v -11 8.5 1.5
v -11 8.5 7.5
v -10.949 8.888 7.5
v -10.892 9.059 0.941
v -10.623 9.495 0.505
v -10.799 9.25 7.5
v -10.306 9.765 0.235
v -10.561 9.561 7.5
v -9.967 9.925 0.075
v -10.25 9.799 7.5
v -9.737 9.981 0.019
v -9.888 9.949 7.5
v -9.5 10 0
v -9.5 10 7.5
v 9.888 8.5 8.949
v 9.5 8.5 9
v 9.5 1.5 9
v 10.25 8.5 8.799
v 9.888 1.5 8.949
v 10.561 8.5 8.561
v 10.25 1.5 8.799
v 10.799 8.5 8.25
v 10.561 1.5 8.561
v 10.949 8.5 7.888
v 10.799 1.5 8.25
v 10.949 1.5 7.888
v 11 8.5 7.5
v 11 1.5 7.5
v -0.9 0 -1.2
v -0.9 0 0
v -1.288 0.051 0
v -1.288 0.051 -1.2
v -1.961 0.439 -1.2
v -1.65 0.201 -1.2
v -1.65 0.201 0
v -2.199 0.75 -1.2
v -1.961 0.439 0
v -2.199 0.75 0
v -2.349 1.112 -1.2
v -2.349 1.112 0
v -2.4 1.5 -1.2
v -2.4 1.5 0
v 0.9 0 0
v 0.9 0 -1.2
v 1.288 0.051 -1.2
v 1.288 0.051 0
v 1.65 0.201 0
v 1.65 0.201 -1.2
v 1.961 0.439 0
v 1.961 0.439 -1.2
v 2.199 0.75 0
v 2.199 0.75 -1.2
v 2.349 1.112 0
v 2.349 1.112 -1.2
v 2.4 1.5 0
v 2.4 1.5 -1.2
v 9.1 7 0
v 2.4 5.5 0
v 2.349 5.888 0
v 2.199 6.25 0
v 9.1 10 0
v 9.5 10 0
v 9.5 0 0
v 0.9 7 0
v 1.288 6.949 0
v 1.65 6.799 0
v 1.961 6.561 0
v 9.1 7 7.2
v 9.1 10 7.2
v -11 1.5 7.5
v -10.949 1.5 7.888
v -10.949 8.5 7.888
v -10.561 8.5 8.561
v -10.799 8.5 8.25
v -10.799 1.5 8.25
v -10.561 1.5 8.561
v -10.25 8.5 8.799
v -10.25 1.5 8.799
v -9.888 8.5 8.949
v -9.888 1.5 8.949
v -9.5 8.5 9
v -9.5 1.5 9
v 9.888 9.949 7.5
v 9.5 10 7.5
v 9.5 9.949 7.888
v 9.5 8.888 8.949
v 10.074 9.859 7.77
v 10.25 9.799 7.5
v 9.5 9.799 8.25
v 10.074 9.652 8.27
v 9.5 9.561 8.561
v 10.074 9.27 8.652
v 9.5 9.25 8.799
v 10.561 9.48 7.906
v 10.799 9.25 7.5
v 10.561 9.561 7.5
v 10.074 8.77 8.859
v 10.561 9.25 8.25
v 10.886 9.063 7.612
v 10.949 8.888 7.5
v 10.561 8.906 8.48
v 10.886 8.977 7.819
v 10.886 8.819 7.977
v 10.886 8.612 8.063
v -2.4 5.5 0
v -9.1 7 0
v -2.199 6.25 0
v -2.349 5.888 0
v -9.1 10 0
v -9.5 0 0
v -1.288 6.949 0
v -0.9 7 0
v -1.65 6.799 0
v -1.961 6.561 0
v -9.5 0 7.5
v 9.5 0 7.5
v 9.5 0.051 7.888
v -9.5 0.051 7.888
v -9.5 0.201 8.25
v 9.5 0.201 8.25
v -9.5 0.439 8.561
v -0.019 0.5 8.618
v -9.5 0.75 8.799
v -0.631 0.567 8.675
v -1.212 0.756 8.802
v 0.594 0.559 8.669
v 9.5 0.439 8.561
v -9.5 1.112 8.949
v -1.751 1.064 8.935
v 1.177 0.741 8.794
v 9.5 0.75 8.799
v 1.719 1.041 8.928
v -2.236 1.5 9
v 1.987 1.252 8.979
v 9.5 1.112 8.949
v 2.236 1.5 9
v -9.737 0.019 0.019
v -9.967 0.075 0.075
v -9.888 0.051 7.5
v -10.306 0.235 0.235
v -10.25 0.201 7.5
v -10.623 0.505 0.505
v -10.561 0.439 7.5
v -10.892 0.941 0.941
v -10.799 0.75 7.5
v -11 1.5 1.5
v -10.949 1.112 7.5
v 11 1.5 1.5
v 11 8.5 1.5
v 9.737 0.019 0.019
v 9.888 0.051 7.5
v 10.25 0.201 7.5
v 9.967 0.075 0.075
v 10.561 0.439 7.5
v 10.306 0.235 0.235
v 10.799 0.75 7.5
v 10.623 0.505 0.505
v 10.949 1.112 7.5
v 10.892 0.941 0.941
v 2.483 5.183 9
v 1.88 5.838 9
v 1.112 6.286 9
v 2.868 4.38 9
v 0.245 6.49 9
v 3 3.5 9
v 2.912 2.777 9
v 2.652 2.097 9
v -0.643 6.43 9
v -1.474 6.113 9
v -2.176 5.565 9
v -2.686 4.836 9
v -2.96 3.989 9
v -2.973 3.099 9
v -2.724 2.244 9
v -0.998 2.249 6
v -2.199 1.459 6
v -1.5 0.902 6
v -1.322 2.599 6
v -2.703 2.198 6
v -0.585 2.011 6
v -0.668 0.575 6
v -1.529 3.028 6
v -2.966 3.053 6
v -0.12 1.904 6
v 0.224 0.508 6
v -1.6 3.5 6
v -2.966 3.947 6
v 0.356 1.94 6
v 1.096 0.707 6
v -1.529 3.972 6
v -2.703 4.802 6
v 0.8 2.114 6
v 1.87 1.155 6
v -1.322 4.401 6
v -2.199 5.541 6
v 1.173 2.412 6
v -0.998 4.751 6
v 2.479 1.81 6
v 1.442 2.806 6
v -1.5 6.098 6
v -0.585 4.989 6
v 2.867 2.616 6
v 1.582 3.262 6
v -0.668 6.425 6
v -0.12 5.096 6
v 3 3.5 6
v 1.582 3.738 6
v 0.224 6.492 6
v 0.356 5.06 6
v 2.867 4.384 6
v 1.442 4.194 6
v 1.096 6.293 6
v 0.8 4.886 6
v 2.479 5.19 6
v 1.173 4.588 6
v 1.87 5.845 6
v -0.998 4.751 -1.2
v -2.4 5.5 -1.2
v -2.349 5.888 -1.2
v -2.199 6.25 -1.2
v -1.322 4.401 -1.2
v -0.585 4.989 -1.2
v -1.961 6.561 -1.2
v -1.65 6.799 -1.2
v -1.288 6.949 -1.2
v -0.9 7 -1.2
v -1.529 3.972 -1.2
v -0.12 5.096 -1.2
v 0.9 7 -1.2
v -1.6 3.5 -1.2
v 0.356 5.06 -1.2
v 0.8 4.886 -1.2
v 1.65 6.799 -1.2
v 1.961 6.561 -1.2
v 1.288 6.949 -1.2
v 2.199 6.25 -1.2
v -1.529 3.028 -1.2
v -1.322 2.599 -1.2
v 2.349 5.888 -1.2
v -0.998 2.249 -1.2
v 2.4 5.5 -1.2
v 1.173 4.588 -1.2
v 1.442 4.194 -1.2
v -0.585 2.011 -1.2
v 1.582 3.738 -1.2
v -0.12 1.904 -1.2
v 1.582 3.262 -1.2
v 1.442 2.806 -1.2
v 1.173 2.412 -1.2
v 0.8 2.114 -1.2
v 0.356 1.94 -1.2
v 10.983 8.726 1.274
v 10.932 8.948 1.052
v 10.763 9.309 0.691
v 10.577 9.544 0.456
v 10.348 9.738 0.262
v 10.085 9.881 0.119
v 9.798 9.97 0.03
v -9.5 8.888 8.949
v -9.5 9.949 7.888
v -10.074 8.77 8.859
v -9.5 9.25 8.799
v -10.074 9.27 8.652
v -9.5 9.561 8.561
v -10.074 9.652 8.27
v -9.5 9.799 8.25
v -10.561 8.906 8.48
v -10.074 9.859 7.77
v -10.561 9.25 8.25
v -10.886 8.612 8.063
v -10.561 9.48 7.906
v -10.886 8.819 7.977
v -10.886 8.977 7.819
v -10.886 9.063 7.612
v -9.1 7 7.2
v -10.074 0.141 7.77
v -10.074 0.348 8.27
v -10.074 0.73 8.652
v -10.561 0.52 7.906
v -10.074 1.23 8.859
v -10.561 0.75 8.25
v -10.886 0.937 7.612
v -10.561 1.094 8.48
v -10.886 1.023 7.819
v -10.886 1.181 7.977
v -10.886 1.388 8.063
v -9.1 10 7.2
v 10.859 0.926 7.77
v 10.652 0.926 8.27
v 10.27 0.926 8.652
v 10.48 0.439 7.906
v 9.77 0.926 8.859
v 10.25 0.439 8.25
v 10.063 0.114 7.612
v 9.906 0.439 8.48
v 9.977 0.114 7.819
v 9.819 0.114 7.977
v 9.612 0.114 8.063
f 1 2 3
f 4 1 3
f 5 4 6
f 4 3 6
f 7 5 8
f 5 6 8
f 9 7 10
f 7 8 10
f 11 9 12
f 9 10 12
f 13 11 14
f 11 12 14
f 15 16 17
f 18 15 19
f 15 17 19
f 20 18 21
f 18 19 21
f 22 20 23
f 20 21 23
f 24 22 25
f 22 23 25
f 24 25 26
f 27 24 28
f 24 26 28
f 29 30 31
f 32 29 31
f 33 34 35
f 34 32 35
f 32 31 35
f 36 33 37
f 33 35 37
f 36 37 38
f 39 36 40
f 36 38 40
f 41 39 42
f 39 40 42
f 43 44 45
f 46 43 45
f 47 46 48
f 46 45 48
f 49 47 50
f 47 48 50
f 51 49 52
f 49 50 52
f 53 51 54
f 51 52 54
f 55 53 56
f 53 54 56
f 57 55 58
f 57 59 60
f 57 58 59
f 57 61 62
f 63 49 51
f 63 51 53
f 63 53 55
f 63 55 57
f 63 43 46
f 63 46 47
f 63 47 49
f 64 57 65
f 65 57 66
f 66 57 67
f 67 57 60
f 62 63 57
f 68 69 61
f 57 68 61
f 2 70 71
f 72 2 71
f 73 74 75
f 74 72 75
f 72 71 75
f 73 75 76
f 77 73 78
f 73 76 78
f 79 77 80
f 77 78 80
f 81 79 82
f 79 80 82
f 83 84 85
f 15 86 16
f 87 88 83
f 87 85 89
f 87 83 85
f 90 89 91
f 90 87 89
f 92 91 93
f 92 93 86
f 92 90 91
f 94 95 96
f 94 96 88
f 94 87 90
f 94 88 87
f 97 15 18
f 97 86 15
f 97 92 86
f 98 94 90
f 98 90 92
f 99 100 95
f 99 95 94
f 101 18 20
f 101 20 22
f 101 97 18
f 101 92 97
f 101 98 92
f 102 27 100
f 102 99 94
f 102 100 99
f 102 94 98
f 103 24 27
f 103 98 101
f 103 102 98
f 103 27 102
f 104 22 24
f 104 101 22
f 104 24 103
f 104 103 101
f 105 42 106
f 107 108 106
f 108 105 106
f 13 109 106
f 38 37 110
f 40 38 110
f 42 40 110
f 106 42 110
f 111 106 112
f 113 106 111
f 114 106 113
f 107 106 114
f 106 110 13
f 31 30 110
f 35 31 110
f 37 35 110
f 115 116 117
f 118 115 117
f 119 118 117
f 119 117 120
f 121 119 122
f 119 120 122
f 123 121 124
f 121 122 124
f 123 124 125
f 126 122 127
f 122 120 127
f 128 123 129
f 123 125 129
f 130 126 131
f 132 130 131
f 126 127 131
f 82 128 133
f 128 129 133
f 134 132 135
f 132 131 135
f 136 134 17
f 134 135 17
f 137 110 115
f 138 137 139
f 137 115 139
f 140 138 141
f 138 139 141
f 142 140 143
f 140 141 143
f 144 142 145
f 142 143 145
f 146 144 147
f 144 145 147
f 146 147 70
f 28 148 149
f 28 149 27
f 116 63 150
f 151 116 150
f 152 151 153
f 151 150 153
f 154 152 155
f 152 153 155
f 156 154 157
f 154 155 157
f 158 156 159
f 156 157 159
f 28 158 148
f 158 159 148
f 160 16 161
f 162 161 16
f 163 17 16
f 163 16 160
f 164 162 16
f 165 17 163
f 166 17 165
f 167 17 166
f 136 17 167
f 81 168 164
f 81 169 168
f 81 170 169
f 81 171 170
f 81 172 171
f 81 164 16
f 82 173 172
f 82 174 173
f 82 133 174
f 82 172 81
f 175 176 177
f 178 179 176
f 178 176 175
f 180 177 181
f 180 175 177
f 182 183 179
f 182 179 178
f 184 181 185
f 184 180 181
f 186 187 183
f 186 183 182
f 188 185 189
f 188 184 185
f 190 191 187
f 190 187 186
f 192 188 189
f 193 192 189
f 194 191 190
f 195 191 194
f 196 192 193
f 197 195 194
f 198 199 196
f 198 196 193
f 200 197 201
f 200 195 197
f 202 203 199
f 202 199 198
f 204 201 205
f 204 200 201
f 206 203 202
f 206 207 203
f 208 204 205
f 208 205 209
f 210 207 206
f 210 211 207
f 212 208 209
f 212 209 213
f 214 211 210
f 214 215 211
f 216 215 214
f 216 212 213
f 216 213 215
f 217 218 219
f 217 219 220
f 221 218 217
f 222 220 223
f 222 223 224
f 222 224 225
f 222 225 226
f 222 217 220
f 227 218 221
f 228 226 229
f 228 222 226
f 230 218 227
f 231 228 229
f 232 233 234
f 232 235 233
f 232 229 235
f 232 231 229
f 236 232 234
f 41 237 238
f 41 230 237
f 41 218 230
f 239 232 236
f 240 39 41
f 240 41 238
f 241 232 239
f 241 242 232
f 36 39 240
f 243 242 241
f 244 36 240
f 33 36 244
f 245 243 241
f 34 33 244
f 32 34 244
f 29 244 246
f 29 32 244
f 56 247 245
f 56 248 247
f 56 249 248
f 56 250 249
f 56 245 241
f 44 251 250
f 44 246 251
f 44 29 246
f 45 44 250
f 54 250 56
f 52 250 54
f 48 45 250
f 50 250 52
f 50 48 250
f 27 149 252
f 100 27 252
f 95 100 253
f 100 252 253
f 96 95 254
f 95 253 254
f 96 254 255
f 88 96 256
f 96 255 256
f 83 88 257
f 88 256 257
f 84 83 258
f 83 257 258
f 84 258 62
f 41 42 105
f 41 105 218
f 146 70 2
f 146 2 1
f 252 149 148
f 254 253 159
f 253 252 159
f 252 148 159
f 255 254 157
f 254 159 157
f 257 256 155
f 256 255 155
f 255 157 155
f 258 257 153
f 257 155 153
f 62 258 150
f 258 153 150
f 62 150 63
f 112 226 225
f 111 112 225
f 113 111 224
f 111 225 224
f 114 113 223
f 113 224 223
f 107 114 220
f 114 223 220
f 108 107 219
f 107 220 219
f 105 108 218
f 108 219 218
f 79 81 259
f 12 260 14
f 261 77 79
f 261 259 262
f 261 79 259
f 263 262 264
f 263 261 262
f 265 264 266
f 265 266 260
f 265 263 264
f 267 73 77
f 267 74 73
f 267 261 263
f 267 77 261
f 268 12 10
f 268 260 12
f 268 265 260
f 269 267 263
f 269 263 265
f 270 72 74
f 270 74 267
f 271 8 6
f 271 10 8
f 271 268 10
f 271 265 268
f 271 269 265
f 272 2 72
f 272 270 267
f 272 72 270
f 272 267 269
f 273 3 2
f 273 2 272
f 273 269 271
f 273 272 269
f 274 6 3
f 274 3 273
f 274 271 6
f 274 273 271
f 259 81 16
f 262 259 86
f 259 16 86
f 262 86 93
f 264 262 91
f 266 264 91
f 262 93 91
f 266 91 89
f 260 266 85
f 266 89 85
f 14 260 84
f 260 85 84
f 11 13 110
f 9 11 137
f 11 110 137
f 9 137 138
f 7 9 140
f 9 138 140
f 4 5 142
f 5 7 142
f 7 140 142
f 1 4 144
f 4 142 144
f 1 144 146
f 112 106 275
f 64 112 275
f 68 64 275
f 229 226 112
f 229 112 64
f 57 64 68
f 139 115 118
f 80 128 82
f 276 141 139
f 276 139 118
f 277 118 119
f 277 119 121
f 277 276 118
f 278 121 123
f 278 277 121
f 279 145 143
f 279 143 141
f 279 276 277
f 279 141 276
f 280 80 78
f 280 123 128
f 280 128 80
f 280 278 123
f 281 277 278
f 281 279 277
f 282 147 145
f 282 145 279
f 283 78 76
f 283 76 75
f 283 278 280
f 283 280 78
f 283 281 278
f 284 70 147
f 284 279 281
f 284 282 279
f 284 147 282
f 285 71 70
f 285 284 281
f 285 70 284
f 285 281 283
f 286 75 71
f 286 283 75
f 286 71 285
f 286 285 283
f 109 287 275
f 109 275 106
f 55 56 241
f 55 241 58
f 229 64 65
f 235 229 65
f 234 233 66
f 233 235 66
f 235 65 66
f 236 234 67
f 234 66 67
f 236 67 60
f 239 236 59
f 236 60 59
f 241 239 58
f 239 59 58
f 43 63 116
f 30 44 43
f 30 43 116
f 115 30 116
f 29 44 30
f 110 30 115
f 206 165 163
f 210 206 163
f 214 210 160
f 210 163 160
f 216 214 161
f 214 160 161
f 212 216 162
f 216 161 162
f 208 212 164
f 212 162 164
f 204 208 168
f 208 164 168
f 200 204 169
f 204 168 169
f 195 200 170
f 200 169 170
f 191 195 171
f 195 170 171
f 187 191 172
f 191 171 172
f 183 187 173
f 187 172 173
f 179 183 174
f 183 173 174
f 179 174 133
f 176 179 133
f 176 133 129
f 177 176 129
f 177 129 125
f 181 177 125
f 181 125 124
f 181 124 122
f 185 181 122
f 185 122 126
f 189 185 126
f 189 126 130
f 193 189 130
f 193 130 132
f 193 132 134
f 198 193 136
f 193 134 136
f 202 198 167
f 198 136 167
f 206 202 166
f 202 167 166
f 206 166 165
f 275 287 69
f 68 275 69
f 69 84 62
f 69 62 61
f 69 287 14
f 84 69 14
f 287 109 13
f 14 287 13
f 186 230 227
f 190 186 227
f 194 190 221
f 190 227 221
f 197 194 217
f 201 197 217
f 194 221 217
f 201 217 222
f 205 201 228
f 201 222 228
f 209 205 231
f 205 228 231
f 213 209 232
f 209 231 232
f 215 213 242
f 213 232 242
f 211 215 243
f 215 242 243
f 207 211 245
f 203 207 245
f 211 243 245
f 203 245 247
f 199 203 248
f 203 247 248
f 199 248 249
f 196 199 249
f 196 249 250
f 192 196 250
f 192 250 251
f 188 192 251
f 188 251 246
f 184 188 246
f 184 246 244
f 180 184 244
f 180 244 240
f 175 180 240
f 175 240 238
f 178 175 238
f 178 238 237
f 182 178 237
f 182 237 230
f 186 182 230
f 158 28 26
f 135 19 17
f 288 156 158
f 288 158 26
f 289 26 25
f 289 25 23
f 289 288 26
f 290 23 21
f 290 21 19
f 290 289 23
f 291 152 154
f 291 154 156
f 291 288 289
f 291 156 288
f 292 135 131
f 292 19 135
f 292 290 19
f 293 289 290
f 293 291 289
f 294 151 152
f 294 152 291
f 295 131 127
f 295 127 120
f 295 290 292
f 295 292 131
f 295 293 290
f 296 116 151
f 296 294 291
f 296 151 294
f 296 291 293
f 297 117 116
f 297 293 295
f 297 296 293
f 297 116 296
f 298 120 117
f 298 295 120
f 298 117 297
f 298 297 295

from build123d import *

# Parameters (mm, degrees)
BOSS_EXTRU_1_DEPTH      = 10
ESQUISSE2_W             = 18.2
ESQUISSE2_H             = 8.4
ENL_V_MAT_EXTRU_1_DEPTH = 3
ESQUISSE3_R             = 1.6
ENL_V_MAT_EXTRU_2_DEPTH = 19.028865744
ESQUISSE4_R             = 3
ENL_V_MAT_EXTRU_3_DEPTH = 3
CONG_1_R                = 1.5


with BuildPart() as part:
    # Esquisse1 → Boss.-Extru.1 (new body)
    with BuildSketch(Plane(origin=(0, 0, 0), x_dir=(1, 0, 0), z_dir=(0, 1, 0))):
        Polygon((2.4, 0), (11, 0), (11, -9), (-11, -9), (-11, 0), (-2.4, 0), (-2.4, 1.2), (2.4, 1.2), align=None)
    extrude(amount=BOSS_EXTRU_1_DEPTH)

    # Esquisse2 → Enlèv. mat.-Extru.1 (cut)
    with BuildSketch(Plane(origin=(0, 10, 0), x_dir=(1, 0, 0), z_dir=(0, 1, 0))):
        with Locations((0, -3)):
            Rectangle(ESQUISSE2_W, ESQUISSE2_H)
    extrude(amount=-ENL_V_MAT_EXTRU_1_DEPTH, mode=Mode.SUBTRACT)

    # Esquisse3 → Enlèv. mat.-Extru.2 (cut, through all)
    with BuildSketch(Plane(origin=(0, 0, -1.2), x_dir=(-1, 0, 0), z_dir=(0, 0, -1))):
        with Locations((0, 3.5)):
            Circle(ESQUISSE3_R)
    extrude(amount=-ENL_V_MAT_EXTRU_2_DEPTH, mode=Mode.SUBTRACT)

    # Esquisse4 → Enlèv. mat.-Extru.3 (cut)
    with BuildSketch(Plane.XY.offset(9)):
        with Locations((0, 3.5)):
            Circle(ESQUISSE4_R)
    extrude(amount=-ENL_V_MAT_EXTRU_3_DEPTH, mode=Mode.SUBTRACT)

    # Congé1
    # the kernel refuses this fillet: 1.5 mm, written as the material it takes off along each edge
    with BuildSketch(Plane(origin=(9.5, 8.5, 7.5), x_dir=(0, 1, 0), z_dir=(1, 0, 0))) as cong_1_piece_1_section:
        Polygon((0, 0), (CONG_1_R, 0), (CONG_1_R, CONG_1_R), (0, CONG_1_R), align=None)
    cong_1_piece_1 = extrude(amount=CONG_1_R, mode=Mode.PRIVATE)
    cong_1_piece_1 = cong_1_piece_1 - Plane(origin=(9.5, 8.5, 7.5), x_dir=(0, -0.7071067811865475, -0.7071067811865475), z_dir=(1, 0, 0)) * Sphere(CONG_1_R, mode=Mode.PRIVATE)
    add(cong_1_piece_1, mode=Mode.SUBTRACT)
    with BuildSketch(Plane(origin=(9.5, 1.5, 7.5), x_dir=(1, 0, 0), z_dir=(0, -1, 0))) as cong_1_piece_2_section:
        Polygon((0, 0), (CONG_1_R, 0), (CONG_1_R, CONG_1_R), (0, CONG_1_R), align=None)
    cong_1_piece_2 = extrude(amount=CONG_1_R, mode=Mode.PRIVATE)
    cong_1_piece_2 = cong_1_piece_2 - Plane(origin=(9.5, 1.5, 7.5), x_dir=(-0.7071067811865476, 0, -0.7071067811865475), z_dir=(0, -1, 0)) * Sphere(CONG_1_R, mode=Mode.PRIVATE)
    add(cong_1_piece_2, mode=Mode.SUBTRACT)
    with BuildSketch(Plane(origin=(-9.5, 1.5, 7.5), x_dir=(0, -1, 0), z_dir=(-1, 0, 0))) as cong_1_piece_3_section:
        Polygon((0, 0), (CONG_1_R, 0), (CONG_1_R, CONG_1_R), (0, CONG_1_R), align=None)
    cong_1_piece_3 = extrude(amount=CONG_1_R, mode=Mode.PRIVATE)
    cong_1_piece_3 = cong_1_piece_3 - Plane(origin=(-9.5, 1.5, 7.5), x_dir=(0, 0.7071067811865475, -0.7071067811865475), z_dir=(-1, 0, 0)) * Sphere(CONG_1_R, mode=Mode.PRIVATE)
    add(cong_1_piece_3, mode=Mode.SUBTRACT)
    with BuildSketch(Plane(origin=(-9.5, 8.5, 7.5), x_dir=(0, 1, 0), z_dir=(-1, 0, 0))) as cong_1_piece_4_section:
        Polygon((0, 0), (CONG_1_R, 0), (CONG_1_R, -CONG_1_R), (0, -CONG_1_R), align=None)
    cong_1_piece_4 = extrude(amount=CONG_1_R, mode=Mode.PRIVATE)
    cong_1_piece_4 = cong_1_piece_4 - Plane(origin=(-9.5, 8.5, 7.5), x_dir=(0, -0.7071067811865475, -0.7071067811865475), z_dir=(-1, 0, 0)) * Sphere(CONG_1_R, mode=Mode.PRIVATE)
    add(cong_1_piece_4, mode=Mode.SUBTRACT)
    with BuildSketch(Plane(origin=(11, 10, -3.75), x_dir=(0, -1, 0), z_dir=(0, 0, 1)), Plane(origin=(-11, 0, 7.5), x_dir=(1, 0, 0), z_dir=(0, 0, -1)), Plane(origin=(11, 0, -3.75), x_dir=(-1, 0, 0), z_dir=(0, 0, 1))) as cong_1_piece_5:
        with BuildLine():
            CenterArc((CONG_1_R, -CONG_1_R), CONG_1_R, 90, 90)
            Line((0, -CONG_1_R), (0, 0))
            Line((0, 0), (CONG_1_R, 0))
        make_face()
    extrude(amount=11.25, mode=Mode.SUBTRACT)
    with BuildSketch(Plane(origin=(9.5, 0, 9), x_dir=(0, 0, -1), z_dir=(-1, 0, 0))) as cong_1_piece_6:
        with BuildLine():
            CenterArc((CONG_1_R, -CONG_1_R), CONG_1_R, 90, 90)
            Line((0, -CONG_1_R), (0, 0))
            Line((0, 0), (CONG_1_R, 0))
        make_face()
    extrude(amount=19, mode=Mode.SUBTRACT)
    with BuildSketch(Plane(origin=(-11, -3.75, 0), x_dir=(0, 0, 1), z_dir=(0, 1, 0)), Plane(origin=(11, -3.75, 0), x_dir=(-1, 0, 0), z_dir=(0, 1, 0))) as cong_1_piece_7:
        with BuildLine():
            CenterArc((CONG_1_R, CONG_1_R), CONG_1_R, 180, 90)
            Line((0, CONG_1_R), (0, 0))
            Line((0, 0), (CONG_1_R, 0))
        make_face()
    extrude(amount=17.5, mode=Mode.SUBTRACT)
    with BuildSketch(Plane(origin=(11, 1.5, 9), x_dir=(0, 0, -1), z_dir=(0, 1, 0)), Plane(origin=(-11, 1.5, 9), x_dir=(1, 0, 0), z_dir=(0, 1, 0))) as cong_1_piece_8:
        with BuildLine():
            CenterArc((CONG_1_R, CONG_1_R), CONG_1_R, 180, 90)
            Line((0, CONG_1_R), (0, 0))
            Line((0, 0), (CONG_1_R, 0))
        make_face()
    extrude(amount=7, mode=Mode.SUBTRACT)
    with BuildSketch(Plane(origin=(2.4, 7, 0), x_dir=(-1, 0, 0), z_dir=(0, 0, -1)), Plane(origin=(-2.4, 7, -4.95), x_dir=(1, 0, 0), z_dir=(0, 0, 1)), Plane(origin=(-2.4, 0, 0), x_dir=(1, 0, 0), z_dir=(0, 0, -1)), Plane(origin=(2.4, 0, -4.95), x_dir=(-1, 0, 0), z_dir=(0, 0, 1))) as cong_1_piece_9:
        with BuildLine():
            CenterArc((CONG_1_R, -CONG_1_R), CONG_1_R, 90, 90)
            Line((0, -CONG_1_R), (0, 0))
            Line((0, 0), (CONG_1_R, 0))
        make_face()
    extrude(amount=4.95, mode=Mode.SUBTRACT)
    with BuildSketch(Plane(origin=(-11, 10, 7.5), x_dir=(1, 0, 0), z_dir=(0, 0, -1))) as cong_1_piece_10:
        with BuildLine():
            CenterArc((CONG_1_R, CONG_1_R), CONG_1_R, 180, 90)
            Line((0, CONG_1_R), (0, 0))
            Line((0, 0), (CONG_1_R, 0))
        make_face()
    extrude(amount=11.25, mode=Mode.SUBTRACT)
    with BuildSketch(Plane(origin=(9.5, 10, 9), x_dir=(0, 0, -1), z_dir=(-1, 0, 0))) as cong_1_piece_11:
        with BuildLine():
            CenterArc((CONG_1_R, CONG_1_R), CONG_1_R, 180, 90)
            Line((0, CONG_1_R), (0, 0))
            Line((0, 0), (CONG_1_R, 0))
        make_face()
    extrude(amount=19, mode=Mode.SUBTRACT)


solid = part.part
